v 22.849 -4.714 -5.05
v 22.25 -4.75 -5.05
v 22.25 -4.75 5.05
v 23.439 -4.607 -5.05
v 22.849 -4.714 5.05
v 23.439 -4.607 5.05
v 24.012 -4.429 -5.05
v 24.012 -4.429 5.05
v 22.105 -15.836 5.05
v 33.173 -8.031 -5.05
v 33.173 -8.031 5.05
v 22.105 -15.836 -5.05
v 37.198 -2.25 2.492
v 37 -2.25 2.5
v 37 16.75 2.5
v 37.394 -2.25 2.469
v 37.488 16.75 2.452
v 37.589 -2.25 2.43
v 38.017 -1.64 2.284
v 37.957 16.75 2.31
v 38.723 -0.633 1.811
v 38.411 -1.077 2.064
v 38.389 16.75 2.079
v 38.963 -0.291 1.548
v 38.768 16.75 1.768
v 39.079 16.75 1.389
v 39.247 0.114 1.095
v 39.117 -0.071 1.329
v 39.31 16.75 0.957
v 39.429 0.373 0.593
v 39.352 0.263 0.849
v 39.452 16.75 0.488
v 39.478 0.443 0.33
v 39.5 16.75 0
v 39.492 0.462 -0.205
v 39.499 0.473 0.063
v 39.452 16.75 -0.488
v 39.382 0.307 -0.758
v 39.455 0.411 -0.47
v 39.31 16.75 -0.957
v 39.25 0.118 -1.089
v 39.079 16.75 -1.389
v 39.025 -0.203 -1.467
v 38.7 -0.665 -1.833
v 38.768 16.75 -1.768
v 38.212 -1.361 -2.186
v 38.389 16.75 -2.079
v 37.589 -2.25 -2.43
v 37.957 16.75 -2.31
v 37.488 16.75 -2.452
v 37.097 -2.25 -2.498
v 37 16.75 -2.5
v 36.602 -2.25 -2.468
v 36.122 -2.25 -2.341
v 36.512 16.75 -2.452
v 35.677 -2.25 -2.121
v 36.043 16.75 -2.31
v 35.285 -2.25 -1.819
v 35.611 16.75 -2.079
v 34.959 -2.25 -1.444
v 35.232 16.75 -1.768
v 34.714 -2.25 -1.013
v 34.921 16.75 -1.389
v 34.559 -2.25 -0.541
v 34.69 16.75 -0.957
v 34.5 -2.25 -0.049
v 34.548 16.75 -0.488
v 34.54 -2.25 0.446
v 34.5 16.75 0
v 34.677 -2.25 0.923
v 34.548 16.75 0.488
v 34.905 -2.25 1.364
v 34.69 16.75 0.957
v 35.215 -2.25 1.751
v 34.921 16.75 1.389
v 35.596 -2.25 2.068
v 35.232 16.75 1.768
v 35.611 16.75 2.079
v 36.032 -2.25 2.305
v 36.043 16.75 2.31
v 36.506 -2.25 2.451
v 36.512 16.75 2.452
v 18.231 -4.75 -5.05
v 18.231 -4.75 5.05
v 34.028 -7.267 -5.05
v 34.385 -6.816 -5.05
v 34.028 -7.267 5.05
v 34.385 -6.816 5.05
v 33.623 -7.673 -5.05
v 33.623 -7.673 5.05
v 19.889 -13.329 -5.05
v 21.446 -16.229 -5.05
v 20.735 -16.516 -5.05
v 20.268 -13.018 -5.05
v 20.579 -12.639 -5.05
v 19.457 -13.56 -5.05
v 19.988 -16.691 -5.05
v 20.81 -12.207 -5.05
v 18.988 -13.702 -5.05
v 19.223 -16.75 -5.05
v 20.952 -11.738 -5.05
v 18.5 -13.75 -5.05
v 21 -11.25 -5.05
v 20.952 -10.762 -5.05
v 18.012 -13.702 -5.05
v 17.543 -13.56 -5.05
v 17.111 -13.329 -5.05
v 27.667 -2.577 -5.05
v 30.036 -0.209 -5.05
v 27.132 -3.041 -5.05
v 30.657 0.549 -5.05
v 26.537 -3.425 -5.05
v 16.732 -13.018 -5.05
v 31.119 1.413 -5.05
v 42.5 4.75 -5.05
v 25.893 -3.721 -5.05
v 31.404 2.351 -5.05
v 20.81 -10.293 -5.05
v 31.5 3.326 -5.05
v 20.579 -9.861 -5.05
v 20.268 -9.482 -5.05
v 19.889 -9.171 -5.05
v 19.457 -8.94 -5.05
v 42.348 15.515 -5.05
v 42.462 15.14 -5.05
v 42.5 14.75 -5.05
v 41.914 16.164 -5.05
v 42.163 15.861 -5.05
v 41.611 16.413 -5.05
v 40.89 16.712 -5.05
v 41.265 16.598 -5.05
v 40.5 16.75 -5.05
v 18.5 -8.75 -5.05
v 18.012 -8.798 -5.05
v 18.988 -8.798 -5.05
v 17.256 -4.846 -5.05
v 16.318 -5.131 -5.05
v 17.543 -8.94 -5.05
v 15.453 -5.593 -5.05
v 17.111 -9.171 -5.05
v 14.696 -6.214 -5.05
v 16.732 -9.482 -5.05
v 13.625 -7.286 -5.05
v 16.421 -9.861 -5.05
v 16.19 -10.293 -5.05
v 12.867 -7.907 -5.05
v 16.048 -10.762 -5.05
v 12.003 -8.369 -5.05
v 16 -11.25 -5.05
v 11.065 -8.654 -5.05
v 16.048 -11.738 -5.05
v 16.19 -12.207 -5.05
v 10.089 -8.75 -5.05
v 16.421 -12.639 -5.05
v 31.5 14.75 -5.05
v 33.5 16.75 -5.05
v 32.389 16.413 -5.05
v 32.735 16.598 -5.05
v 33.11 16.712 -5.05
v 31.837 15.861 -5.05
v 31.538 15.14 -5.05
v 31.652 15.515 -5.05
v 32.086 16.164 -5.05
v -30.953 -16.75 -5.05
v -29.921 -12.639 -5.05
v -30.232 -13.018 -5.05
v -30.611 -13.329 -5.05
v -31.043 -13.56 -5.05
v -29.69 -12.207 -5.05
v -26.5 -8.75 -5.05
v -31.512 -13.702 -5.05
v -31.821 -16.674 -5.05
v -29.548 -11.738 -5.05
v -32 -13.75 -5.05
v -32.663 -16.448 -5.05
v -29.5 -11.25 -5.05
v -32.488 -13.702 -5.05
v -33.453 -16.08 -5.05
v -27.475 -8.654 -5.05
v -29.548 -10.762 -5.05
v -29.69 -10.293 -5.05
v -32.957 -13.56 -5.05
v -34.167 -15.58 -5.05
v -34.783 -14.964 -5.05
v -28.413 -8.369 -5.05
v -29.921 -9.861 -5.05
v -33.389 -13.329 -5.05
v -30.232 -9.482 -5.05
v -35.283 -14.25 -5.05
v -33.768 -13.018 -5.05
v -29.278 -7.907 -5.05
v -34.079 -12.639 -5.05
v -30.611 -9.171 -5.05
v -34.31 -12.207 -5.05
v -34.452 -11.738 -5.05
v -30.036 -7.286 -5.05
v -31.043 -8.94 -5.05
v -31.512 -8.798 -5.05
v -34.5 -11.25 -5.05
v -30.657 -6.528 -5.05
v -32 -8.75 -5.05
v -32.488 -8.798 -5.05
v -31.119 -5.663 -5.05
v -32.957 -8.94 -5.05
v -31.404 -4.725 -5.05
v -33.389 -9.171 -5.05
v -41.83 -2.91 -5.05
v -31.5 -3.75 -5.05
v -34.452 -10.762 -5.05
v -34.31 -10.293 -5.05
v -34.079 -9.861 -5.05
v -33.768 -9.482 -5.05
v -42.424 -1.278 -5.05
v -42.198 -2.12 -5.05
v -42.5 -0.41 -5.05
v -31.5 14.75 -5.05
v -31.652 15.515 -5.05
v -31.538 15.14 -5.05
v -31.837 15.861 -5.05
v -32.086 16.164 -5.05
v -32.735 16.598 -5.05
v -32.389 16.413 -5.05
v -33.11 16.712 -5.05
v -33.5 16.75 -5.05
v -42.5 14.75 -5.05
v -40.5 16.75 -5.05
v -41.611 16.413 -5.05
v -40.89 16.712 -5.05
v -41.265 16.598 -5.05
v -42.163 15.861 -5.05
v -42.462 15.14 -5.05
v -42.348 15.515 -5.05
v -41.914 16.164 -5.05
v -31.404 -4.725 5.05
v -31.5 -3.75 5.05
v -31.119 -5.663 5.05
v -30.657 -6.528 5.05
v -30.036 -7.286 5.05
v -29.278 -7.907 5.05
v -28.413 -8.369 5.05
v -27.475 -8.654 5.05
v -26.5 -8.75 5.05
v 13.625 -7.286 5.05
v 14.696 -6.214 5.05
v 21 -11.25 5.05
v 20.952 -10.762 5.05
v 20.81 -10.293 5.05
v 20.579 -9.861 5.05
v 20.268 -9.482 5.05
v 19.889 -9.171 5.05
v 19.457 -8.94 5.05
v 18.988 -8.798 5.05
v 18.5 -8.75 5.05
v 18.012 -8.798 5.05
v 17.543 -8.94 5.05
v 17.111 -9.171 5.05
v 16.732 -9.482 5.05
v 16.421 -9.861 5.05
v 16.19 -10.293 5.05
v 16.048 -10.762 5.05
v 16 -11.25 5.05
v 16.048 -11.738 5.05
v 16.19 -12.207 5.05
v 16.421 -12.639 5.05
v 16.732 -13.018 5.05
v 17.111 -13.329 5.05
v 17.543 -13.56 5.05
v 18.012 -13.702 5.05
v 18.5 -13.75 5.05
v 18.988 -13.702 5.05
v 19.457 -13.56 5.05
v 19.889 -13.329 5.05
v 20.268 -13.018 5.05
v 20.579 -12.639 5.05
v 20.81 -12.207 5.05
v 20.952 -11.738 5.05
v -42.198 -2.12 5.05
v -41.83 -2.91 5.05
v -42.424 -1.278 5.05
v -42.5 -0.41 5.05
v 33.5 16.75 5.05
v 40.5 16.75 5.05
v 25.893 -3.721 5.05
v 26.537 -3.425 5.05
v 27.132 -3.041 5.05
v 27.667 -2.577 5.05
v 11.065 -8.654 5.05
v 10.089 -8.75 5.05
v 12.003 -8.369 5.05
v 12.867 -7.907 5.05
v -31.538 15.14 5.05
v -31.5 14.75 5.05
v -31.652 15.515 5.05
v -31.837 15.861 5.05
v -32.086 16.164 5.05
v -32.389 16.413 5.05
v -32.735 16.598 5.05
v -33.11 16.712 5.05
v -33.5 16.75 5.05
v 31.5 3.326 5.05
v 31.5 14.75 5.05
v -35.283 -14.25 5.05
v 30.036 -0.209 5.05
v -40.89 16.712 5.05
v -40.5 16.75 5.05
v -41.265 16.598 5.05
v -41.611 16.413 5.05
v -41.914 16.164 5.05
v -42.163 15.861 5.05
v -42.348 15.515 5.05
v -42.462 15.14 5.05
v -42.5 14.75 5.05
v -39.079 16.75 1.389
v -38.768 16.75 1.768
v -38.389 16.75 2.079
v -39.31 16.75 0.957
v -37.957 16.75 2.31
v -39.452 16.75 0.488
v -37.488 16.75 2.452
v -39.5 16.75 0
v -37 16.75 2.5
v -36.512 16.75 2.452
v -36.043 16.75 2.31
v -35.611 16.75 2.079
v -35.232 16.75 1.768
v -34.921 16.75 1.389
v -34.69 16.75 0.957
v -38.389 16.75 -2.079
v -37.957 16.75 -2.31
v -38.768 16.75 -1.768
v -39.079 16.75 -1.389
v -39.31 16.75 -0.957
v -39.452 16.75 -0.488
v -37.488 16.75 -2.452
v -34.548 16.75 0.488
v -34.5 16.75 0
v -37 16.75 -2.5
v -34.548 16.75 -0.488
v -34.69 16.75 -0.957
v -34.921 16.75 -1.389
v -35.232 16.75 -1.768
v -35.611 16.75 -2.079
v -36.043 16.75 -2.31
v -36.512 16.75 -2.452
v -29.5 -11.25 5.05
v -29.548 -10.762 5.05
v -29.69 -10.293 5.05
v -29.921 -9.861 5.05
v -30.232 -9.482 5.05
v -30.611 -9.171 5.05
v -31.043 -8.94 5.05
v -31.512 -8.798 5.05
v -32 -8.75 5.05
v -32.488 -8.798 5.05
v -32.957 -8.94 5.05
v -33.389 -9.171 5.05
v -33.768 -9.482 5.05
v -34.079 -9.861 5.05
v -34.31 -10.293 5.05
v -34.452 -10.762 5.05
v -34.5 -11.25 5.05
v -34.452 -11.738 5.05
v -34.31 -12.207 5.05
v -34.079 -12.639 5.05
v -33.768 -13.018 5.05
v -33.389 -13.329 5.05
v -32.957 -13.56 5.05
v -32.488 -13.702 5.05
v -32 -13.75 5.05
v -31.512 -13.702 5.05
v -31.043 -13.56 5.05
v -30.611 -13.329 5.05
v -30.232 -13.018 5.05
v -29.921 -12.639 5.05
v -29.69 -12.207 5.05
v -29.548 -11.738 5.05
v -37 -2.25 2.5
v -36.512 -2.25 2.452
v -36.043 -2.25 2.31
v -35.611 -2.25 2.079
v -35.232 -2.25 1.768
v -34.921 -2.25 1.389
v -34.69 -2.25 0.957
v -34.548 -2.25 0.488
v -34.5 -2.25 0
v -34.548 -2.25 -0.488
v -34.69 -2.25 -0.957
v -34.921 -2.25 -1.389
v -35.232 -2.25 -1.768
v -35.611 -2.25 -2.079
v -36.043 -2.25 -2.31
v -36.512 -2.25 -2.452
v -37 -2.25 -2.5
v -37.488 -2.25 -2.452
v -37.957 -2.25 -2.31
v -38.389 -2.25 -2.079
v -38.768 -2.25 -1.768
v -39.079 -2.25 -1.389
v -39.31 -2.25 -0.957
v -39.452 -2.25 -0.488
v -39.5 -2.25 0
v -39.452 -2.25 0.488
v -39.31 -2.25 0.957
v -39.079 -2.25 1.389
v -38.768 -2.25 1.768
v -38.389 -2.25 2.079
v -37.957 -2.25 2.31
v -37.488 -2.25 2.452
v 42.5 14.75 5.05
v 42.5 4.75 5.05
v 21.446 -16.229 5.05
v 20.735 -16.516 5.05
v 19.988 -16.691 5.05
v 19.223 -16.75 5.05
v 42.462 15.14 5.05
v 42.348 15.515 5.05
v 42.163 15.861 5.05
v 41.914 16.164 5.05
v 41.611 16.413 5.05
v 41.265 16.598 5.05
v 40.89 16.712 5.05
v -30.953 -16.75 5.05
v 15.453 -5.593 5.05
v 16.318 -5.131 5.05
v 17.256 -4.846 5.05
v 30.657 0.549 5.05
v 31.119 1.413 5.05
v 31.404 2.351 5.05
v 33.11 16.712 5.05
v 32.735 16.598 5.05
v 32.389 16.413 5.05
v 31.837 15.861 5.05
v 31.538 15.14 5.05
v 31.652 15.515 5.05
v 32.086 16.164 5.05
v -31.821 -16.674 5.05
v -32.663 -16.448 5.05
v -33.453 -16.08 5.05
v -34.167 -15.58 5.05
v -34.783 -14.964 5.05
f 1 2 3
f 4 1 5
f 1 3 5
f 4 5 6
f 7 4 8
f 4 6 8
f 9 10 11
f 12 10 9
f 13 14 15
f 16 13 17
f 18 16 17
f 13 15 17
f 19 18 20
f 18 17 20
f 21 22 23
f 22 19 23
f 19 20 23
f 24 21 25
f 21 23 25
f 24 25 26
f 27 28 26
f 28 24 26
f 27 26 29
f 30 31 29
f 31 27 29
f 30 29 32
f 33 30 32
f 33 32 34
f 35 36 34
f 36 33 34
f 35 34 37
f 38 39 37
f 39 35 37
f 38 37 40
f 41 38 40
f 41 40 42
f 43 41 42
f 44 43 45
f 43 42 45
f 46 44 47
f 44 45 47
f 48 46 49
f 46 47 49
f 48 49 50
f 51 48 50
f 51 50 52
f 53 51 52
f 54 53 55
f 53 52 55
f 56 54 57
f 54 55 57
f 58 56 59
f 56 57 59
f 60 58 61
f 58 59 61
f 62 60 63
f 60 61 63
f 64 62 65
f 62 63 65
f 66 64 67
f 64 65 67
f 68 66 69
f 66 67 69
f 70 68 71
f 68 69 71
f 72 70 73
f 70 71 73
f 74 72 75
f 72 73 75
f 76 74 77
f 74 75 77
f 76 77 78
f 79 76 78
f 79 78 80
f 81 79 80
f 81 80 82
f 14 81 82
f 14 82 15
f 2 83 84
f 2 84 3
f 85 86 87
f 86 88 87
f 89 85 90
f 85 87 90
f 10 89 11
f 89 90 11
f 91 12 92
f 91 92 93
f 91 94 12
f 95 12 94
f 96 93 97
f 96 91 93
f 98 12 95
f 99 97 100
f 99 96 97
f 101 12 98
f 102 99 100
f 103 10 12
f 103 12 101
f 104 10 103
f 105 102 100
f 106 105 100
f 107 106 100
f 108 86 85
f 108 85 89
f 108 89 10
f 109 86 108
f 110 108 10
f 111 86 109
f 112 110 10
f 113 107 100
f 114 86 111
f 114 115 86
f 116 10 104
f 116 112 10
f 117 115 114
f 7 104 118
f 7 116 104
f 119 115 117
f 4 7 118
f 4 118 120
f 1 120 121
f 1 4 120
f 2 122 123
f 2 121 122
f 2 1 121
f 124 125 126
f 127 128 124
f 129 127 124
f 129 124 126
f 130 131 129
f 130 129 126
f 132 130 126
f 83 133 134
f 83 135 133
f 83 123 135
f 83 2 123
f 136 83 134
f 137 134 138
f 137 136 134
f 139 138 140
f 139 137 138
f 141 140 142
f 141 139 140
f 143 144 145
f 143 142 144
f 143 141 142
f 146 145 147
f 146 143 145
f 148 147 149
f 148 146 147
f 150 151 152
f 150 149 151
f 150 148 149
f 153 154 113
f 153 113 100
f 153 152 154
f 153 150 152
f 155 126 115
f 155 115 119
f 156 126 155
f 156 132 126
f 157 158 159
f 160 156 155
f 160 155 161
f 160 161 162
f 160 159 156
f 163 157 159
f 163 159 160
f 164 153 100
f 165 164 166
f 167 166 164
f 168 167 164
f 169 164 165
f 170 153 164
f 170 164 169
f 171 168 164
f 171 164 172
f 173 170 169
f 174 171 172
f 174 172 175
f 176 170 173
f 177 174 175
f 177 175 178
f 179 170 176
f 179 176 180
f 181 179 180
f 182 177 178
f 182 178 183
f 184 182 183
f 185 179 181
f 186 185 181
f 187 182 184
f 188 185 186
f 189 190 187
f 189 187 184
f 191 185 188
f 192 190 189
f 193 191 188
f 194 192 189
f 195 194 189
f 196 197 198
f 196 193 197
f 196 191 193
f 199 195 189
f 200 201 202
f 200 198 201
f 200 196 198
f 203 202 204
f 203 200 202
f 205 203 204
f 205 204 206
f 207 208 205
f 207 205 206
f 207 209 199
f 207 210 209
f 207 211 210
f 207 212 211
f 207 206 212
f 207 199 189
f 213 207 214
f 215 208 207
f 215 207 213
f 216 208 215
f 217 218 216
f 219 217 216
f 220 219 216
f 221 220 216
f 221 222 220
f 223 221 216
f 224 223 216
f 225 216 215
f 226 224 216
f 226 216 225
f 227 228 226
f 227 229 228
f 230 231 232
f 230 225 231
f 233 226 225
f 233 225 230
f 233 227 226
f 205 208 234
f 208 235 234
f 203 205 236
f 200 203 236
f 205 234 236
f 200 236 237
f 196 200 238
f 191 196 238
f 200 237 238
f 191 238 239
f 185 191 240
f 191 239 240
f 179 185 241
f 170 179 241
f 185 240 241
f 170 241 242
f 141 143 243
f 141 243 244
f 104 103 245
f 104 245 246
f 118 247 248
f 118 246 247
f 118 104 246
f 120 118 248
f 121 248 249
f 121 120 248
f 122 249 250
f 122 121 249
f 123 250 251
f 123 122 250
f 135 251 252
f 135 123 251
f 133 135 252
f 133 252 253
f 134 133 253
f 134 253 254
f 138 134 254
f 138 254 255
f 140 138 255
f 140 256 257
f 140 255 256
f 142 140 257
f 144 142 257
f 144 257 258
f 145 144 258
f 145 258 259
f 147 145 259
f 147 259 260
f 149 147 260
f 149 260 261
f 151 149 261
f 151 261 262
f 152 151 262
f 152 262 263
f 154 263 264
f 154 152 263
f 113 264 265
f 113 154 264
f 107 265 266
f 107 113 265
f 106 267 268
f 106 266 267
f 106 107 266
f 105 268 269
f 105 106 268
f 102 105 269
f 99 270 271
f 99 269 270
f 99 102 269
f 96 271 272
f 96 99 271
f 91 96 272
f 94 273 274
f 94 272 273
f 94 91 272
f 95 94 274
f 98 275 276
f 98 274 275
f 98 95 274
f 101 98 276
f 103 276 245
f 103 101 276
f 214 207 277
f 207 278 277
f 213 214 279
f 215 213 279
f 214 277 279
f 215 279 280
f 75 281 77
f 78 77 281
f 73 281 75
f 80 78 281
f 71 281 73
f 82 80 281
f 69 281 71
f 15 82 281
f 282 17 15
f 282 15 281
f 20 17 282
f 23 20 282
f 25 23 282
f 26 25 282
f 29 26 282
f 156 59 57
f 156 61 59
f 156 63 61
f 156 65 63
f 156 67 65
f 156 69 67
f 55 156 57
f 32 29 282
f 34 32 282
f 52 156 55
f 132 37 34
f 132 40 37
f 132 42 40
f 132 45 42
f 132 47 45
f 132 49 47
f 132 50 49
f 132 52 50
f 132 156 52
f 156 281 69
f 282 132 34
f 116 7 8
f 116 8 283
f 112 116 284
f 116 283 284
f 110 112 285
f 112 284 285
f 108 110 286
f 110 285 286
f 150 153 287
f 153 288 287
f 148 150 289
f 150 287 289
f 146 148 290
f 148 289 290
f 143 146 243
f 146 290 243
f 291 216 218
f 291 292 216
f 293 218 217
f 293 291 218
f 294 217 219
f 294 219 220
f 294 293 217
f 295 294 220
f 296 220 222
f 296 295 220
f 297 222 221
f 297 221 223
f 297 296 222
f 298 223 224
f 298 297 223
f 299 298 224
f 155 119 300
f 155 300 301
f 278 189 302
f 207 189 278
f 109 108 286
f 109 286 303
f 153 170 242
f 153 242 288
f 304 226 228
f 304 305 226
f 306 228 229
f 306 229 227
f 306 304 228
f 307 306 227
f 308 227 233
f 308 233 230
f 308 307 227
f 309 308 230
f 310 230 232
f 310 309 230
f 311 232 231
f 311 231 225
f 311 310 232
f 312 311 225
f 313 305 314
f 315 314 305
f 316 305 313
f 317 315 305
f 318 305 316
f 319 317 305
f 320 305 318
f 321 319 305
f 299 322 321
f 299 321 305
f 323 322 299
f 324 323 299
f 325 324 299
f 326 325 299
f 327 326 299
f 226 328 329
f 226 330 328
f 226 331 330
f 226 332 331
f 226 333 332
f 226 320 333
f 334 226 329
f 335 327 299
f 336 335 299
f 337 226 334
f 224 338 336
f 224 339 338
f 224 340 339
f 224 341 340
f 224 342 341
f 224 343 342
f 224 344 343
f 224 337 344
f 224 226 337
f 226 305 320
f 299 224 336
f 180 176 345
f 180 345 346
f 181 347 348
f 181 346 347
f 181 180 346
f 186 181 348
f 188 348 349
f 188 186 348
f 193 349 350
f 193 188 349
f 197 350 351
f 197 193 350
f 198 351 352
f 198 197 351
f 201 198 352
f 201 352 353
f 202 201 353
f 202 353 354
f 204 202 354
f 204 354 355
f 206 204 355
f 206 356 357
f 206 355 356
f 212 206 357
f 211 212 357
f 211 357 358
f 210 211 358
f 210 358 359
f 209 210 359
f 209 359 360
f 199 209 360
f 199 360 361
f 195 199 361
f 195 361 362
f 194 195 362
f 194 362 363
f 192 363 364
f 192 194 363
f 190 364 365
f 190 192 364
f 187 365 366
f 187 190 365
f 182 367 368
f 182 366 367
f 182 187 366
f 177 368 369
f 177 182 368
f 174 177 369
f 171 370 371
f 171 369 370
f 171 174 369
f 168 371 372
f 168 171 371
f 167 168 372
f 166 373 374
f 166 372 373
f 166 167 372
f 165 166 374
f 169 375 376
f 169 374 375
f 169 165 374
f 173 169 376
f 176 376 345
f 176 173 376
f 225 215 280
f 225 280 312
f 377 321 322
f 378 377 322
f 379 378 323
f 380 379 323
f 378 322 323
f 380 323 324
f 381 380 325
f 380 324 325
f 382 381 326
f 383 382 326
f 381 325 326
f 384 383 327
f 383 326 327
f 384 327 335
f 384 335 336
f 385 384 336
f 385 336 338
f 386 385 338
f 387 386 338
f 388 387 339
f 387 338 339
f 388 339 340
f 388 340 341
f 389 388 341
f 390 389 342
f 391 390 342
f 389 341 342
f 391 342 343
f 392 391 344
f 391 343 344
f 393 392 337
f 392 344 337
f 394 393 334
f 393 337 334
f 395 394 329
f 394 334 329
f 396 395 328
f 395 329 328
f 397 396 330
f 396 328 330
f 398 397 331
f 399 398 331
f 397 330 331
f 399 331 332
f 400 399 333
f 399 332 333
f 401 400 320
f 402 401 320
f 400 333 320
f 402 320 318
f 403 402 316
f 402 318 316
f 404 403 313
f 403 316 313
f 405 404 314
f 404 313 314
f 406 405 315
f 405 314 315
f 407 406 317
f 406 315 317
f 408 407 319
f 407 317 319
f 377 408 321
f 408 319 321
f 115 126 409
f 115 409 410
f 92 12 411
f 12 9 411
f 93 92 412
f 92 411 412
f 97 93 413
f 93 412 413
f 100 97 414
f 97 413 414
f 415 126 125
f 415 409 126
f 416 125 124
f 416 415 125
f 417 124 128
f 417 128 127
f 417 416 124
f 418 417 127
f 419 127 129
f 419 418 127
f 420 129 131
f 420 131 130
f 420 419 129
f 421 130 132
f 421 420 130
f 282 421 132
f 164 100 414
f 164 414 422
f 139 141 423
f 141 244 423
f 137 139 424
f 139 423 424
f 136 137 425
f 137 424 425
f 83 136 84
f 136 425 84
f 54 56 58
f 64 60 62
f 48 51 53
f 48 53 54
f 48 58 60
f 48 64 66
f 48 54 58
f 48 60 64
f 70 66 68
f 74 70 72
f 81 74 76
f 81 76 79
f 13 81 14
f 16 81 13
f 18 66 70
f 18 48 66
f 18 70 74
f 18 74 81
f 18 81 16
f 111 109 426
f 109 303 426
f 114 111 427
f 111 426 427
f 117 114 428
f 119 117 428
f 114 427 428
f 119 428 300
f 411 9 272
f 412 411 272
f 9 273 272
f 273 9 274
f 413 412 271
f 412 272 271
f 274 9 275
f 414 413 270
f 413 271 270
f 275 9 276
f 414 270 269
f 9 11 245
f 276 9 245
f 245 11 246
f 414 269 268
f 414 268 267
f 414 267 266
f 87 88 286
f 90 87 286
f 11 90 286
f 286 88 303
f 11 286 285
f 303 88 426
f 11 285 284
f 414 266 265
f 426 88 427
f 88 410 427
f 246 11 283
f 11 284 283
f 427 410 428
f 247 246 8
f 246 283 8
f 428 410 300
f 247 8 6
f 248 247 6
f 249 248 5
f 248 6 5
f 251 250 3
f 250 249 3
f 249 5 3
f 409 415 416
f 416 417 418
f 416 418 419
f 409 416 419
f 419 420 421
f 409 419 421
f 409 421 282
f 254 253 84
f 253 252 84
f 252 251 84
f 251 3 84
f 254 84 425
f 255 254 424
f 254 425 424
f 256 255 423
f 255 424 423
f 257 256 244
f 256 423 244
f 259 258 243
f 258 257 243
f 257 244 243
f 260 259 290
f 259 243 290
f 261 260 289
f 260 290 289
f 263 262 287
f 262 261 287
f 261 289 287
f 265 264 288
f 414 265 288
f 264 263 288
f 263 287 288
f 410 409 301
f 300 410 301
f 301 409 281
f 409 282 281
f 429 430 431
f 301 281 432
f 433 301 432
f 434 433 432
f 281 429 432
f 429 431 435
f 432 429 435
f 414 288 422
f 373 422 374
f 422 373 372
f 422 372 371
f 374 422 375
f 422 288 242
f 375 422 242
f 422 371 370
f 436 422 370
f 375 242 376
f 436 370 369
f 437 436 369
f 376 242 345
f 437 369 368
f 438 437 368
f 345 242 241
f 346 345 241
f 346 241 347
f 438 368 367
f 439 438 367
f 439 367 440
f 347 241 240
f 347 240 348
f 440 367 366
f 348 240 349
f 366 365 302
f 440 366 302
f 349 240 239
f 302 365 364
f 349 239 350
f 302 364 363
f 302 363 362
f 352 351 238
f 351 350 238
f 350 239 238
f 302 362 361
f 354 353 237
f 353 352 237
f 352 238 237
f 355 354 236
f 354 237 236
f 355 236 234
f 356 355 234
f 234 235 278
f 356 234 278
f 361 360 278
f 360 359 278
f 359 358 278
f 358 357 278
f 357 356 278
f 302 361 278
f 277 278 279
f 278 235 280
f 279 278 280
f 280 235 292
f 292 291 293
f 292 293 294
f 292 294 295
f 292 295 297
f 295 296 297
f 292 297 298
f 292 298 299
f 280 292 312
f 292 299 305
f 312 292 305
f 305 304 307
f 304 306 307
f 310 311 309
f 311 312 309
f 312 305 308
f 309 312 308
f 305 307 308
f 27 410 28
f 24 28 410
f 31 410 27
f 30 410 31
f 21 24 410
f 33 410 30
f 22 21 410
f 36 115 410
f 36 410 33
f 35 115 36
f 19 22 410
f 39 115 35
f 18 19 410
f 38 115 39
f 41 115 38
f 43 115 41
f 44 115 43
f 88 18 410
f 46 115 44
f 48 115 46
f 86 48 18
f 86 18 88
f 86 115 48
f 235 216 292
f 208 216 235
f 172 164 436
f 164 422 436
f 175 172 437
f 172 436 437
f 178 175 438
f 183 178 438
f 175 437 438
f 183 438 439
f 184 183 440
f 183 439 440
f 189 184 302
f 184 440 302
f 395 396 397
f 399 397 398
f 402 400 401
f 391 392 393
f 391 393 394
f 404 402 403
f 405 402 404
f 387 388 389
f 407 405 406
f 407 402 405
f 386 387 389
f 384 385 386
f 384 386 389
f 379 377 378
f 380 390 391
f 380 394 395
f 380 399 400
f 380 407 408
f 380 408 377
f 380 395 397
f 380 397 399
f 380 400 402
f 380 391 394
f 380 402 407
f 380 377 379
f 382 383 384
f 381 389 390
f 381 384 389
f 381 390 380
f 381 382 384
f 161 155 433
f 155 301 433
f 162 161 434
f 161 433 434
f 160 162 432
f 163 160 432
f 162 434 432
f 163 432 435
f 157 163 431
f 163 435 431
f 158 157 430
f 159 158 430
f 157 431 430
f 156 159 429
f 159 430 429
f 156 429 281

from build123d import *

# Parameters (mm, degrees)
BOSS_EXTRUDE1_DEPTH      = 5.05
BOSS_EXTRUDE1_DEPTH_BACK = 5.05
FILLET1_R                = 5
SKETCH2_R                = 2.5
CUT_EXTRUDE1_DEPTH       = 19
FILLET2_R                = 2
CUT_EXTRUDE2_DEPTH       = 46.959928198
CUT_EXTRUDE2_DEPTH_BACK  = 46.959928198
SKETCH3_R                = 2.5


with BuildPart() as part:
    # Sketch1 → Boss-Extrude1 (new, two sides: drawn at the far end of the back side and taken through both)
    with BuildSketch(Plane.XY.offset(-BOSS_EXTRUDE1_DEPTH_BACK)):
        Polygon((-31.5, 16.75), (-31.5, -8.75), (12.160254038, -8.75), (16.160254038, -4.75), (23.160254038, -4.75), (26.903805922, -3.340808995), (31.5, 1.255385083), (31.5, 16.75), (42.5, 16.75), (42.5, 4.75), (33.884592717, -7.529037314), (20.808895905, -16.75), (-33.839745962, -16.75), (-42.5, -1.75), (-42.5, 16.75), align=None)
    extrude(amount=BOSS_EXTRUDE1_DEPTH + BOSS_EXTRUDE1_DEPTH_BACK)

    # Fillet1
    fillet1_edges = [part.edges().sort_by_distance(p)[0] for p in [
        (31.5, 1.255385083, 0),
        (26.903805922, -3.340808995, 0),
        (23.160254038, -4.75, 0),
        (16.160254038, -4.75, 0),
        (12.160254038, -8.75, 0),
        (33.884592717, -7.529037314, 0),
        (20.808895905, -16.75, 0),
        (-33.839745962, -16.75, 0),
        (-42.5, -1.75, 0),
        (-31.5, -8.75, 0),
    ]]
    fillet(fillet1_edges, radius=FILLET1_R)

    # Sketch2 → Cut-Extrude1 (cut)
    with BuildSketch(Plane(origin=(0, 16.75, 0), x_dir=(1, 0, 0), z_dir=(0, 1, 0))):
        with Locations((-37, 0)):
            Circle(SKETCH2_R)
        with Locations((37, 0)):
            Circle(SKETCH2_R)
    extrude(amount=-CUT_EXTRUDE1_DEPTH, mode=Mode.SUBTRACT)

    # Fillet2
    fillet2_edges = [part.edges().sort_by_distance(p)[0] for p in [
        (42.5, 16.75, 0),
        (31.5, 16.75, 0),
        (-31.5, 16.75, 0),
        (-42.5, 16.75, 0),
    ]]
    fillet(fillet2_edges, radius=FILLET2_R)

    # Sketch3 → Cut-Extrude2 (cut, two sides: drawn at the far end of the back side and taken through both)
    with BuildSketch(Plane.XY.offset(-CUT_EXTRUDE2_DEPTH_BACK)):
        with Locations((-32, -11.25)):
            Circle(SKETCH3_R)
        with Locations((18.5, -11.25)):
            Circle(SKETCH3_R)
    extrude(amount=CUT_EXTRUDE2_DEPTH + CUT_EXTRUDE2_DEPTH_BACK, mode=Mode.SUBTRACT)


solid = part.part
